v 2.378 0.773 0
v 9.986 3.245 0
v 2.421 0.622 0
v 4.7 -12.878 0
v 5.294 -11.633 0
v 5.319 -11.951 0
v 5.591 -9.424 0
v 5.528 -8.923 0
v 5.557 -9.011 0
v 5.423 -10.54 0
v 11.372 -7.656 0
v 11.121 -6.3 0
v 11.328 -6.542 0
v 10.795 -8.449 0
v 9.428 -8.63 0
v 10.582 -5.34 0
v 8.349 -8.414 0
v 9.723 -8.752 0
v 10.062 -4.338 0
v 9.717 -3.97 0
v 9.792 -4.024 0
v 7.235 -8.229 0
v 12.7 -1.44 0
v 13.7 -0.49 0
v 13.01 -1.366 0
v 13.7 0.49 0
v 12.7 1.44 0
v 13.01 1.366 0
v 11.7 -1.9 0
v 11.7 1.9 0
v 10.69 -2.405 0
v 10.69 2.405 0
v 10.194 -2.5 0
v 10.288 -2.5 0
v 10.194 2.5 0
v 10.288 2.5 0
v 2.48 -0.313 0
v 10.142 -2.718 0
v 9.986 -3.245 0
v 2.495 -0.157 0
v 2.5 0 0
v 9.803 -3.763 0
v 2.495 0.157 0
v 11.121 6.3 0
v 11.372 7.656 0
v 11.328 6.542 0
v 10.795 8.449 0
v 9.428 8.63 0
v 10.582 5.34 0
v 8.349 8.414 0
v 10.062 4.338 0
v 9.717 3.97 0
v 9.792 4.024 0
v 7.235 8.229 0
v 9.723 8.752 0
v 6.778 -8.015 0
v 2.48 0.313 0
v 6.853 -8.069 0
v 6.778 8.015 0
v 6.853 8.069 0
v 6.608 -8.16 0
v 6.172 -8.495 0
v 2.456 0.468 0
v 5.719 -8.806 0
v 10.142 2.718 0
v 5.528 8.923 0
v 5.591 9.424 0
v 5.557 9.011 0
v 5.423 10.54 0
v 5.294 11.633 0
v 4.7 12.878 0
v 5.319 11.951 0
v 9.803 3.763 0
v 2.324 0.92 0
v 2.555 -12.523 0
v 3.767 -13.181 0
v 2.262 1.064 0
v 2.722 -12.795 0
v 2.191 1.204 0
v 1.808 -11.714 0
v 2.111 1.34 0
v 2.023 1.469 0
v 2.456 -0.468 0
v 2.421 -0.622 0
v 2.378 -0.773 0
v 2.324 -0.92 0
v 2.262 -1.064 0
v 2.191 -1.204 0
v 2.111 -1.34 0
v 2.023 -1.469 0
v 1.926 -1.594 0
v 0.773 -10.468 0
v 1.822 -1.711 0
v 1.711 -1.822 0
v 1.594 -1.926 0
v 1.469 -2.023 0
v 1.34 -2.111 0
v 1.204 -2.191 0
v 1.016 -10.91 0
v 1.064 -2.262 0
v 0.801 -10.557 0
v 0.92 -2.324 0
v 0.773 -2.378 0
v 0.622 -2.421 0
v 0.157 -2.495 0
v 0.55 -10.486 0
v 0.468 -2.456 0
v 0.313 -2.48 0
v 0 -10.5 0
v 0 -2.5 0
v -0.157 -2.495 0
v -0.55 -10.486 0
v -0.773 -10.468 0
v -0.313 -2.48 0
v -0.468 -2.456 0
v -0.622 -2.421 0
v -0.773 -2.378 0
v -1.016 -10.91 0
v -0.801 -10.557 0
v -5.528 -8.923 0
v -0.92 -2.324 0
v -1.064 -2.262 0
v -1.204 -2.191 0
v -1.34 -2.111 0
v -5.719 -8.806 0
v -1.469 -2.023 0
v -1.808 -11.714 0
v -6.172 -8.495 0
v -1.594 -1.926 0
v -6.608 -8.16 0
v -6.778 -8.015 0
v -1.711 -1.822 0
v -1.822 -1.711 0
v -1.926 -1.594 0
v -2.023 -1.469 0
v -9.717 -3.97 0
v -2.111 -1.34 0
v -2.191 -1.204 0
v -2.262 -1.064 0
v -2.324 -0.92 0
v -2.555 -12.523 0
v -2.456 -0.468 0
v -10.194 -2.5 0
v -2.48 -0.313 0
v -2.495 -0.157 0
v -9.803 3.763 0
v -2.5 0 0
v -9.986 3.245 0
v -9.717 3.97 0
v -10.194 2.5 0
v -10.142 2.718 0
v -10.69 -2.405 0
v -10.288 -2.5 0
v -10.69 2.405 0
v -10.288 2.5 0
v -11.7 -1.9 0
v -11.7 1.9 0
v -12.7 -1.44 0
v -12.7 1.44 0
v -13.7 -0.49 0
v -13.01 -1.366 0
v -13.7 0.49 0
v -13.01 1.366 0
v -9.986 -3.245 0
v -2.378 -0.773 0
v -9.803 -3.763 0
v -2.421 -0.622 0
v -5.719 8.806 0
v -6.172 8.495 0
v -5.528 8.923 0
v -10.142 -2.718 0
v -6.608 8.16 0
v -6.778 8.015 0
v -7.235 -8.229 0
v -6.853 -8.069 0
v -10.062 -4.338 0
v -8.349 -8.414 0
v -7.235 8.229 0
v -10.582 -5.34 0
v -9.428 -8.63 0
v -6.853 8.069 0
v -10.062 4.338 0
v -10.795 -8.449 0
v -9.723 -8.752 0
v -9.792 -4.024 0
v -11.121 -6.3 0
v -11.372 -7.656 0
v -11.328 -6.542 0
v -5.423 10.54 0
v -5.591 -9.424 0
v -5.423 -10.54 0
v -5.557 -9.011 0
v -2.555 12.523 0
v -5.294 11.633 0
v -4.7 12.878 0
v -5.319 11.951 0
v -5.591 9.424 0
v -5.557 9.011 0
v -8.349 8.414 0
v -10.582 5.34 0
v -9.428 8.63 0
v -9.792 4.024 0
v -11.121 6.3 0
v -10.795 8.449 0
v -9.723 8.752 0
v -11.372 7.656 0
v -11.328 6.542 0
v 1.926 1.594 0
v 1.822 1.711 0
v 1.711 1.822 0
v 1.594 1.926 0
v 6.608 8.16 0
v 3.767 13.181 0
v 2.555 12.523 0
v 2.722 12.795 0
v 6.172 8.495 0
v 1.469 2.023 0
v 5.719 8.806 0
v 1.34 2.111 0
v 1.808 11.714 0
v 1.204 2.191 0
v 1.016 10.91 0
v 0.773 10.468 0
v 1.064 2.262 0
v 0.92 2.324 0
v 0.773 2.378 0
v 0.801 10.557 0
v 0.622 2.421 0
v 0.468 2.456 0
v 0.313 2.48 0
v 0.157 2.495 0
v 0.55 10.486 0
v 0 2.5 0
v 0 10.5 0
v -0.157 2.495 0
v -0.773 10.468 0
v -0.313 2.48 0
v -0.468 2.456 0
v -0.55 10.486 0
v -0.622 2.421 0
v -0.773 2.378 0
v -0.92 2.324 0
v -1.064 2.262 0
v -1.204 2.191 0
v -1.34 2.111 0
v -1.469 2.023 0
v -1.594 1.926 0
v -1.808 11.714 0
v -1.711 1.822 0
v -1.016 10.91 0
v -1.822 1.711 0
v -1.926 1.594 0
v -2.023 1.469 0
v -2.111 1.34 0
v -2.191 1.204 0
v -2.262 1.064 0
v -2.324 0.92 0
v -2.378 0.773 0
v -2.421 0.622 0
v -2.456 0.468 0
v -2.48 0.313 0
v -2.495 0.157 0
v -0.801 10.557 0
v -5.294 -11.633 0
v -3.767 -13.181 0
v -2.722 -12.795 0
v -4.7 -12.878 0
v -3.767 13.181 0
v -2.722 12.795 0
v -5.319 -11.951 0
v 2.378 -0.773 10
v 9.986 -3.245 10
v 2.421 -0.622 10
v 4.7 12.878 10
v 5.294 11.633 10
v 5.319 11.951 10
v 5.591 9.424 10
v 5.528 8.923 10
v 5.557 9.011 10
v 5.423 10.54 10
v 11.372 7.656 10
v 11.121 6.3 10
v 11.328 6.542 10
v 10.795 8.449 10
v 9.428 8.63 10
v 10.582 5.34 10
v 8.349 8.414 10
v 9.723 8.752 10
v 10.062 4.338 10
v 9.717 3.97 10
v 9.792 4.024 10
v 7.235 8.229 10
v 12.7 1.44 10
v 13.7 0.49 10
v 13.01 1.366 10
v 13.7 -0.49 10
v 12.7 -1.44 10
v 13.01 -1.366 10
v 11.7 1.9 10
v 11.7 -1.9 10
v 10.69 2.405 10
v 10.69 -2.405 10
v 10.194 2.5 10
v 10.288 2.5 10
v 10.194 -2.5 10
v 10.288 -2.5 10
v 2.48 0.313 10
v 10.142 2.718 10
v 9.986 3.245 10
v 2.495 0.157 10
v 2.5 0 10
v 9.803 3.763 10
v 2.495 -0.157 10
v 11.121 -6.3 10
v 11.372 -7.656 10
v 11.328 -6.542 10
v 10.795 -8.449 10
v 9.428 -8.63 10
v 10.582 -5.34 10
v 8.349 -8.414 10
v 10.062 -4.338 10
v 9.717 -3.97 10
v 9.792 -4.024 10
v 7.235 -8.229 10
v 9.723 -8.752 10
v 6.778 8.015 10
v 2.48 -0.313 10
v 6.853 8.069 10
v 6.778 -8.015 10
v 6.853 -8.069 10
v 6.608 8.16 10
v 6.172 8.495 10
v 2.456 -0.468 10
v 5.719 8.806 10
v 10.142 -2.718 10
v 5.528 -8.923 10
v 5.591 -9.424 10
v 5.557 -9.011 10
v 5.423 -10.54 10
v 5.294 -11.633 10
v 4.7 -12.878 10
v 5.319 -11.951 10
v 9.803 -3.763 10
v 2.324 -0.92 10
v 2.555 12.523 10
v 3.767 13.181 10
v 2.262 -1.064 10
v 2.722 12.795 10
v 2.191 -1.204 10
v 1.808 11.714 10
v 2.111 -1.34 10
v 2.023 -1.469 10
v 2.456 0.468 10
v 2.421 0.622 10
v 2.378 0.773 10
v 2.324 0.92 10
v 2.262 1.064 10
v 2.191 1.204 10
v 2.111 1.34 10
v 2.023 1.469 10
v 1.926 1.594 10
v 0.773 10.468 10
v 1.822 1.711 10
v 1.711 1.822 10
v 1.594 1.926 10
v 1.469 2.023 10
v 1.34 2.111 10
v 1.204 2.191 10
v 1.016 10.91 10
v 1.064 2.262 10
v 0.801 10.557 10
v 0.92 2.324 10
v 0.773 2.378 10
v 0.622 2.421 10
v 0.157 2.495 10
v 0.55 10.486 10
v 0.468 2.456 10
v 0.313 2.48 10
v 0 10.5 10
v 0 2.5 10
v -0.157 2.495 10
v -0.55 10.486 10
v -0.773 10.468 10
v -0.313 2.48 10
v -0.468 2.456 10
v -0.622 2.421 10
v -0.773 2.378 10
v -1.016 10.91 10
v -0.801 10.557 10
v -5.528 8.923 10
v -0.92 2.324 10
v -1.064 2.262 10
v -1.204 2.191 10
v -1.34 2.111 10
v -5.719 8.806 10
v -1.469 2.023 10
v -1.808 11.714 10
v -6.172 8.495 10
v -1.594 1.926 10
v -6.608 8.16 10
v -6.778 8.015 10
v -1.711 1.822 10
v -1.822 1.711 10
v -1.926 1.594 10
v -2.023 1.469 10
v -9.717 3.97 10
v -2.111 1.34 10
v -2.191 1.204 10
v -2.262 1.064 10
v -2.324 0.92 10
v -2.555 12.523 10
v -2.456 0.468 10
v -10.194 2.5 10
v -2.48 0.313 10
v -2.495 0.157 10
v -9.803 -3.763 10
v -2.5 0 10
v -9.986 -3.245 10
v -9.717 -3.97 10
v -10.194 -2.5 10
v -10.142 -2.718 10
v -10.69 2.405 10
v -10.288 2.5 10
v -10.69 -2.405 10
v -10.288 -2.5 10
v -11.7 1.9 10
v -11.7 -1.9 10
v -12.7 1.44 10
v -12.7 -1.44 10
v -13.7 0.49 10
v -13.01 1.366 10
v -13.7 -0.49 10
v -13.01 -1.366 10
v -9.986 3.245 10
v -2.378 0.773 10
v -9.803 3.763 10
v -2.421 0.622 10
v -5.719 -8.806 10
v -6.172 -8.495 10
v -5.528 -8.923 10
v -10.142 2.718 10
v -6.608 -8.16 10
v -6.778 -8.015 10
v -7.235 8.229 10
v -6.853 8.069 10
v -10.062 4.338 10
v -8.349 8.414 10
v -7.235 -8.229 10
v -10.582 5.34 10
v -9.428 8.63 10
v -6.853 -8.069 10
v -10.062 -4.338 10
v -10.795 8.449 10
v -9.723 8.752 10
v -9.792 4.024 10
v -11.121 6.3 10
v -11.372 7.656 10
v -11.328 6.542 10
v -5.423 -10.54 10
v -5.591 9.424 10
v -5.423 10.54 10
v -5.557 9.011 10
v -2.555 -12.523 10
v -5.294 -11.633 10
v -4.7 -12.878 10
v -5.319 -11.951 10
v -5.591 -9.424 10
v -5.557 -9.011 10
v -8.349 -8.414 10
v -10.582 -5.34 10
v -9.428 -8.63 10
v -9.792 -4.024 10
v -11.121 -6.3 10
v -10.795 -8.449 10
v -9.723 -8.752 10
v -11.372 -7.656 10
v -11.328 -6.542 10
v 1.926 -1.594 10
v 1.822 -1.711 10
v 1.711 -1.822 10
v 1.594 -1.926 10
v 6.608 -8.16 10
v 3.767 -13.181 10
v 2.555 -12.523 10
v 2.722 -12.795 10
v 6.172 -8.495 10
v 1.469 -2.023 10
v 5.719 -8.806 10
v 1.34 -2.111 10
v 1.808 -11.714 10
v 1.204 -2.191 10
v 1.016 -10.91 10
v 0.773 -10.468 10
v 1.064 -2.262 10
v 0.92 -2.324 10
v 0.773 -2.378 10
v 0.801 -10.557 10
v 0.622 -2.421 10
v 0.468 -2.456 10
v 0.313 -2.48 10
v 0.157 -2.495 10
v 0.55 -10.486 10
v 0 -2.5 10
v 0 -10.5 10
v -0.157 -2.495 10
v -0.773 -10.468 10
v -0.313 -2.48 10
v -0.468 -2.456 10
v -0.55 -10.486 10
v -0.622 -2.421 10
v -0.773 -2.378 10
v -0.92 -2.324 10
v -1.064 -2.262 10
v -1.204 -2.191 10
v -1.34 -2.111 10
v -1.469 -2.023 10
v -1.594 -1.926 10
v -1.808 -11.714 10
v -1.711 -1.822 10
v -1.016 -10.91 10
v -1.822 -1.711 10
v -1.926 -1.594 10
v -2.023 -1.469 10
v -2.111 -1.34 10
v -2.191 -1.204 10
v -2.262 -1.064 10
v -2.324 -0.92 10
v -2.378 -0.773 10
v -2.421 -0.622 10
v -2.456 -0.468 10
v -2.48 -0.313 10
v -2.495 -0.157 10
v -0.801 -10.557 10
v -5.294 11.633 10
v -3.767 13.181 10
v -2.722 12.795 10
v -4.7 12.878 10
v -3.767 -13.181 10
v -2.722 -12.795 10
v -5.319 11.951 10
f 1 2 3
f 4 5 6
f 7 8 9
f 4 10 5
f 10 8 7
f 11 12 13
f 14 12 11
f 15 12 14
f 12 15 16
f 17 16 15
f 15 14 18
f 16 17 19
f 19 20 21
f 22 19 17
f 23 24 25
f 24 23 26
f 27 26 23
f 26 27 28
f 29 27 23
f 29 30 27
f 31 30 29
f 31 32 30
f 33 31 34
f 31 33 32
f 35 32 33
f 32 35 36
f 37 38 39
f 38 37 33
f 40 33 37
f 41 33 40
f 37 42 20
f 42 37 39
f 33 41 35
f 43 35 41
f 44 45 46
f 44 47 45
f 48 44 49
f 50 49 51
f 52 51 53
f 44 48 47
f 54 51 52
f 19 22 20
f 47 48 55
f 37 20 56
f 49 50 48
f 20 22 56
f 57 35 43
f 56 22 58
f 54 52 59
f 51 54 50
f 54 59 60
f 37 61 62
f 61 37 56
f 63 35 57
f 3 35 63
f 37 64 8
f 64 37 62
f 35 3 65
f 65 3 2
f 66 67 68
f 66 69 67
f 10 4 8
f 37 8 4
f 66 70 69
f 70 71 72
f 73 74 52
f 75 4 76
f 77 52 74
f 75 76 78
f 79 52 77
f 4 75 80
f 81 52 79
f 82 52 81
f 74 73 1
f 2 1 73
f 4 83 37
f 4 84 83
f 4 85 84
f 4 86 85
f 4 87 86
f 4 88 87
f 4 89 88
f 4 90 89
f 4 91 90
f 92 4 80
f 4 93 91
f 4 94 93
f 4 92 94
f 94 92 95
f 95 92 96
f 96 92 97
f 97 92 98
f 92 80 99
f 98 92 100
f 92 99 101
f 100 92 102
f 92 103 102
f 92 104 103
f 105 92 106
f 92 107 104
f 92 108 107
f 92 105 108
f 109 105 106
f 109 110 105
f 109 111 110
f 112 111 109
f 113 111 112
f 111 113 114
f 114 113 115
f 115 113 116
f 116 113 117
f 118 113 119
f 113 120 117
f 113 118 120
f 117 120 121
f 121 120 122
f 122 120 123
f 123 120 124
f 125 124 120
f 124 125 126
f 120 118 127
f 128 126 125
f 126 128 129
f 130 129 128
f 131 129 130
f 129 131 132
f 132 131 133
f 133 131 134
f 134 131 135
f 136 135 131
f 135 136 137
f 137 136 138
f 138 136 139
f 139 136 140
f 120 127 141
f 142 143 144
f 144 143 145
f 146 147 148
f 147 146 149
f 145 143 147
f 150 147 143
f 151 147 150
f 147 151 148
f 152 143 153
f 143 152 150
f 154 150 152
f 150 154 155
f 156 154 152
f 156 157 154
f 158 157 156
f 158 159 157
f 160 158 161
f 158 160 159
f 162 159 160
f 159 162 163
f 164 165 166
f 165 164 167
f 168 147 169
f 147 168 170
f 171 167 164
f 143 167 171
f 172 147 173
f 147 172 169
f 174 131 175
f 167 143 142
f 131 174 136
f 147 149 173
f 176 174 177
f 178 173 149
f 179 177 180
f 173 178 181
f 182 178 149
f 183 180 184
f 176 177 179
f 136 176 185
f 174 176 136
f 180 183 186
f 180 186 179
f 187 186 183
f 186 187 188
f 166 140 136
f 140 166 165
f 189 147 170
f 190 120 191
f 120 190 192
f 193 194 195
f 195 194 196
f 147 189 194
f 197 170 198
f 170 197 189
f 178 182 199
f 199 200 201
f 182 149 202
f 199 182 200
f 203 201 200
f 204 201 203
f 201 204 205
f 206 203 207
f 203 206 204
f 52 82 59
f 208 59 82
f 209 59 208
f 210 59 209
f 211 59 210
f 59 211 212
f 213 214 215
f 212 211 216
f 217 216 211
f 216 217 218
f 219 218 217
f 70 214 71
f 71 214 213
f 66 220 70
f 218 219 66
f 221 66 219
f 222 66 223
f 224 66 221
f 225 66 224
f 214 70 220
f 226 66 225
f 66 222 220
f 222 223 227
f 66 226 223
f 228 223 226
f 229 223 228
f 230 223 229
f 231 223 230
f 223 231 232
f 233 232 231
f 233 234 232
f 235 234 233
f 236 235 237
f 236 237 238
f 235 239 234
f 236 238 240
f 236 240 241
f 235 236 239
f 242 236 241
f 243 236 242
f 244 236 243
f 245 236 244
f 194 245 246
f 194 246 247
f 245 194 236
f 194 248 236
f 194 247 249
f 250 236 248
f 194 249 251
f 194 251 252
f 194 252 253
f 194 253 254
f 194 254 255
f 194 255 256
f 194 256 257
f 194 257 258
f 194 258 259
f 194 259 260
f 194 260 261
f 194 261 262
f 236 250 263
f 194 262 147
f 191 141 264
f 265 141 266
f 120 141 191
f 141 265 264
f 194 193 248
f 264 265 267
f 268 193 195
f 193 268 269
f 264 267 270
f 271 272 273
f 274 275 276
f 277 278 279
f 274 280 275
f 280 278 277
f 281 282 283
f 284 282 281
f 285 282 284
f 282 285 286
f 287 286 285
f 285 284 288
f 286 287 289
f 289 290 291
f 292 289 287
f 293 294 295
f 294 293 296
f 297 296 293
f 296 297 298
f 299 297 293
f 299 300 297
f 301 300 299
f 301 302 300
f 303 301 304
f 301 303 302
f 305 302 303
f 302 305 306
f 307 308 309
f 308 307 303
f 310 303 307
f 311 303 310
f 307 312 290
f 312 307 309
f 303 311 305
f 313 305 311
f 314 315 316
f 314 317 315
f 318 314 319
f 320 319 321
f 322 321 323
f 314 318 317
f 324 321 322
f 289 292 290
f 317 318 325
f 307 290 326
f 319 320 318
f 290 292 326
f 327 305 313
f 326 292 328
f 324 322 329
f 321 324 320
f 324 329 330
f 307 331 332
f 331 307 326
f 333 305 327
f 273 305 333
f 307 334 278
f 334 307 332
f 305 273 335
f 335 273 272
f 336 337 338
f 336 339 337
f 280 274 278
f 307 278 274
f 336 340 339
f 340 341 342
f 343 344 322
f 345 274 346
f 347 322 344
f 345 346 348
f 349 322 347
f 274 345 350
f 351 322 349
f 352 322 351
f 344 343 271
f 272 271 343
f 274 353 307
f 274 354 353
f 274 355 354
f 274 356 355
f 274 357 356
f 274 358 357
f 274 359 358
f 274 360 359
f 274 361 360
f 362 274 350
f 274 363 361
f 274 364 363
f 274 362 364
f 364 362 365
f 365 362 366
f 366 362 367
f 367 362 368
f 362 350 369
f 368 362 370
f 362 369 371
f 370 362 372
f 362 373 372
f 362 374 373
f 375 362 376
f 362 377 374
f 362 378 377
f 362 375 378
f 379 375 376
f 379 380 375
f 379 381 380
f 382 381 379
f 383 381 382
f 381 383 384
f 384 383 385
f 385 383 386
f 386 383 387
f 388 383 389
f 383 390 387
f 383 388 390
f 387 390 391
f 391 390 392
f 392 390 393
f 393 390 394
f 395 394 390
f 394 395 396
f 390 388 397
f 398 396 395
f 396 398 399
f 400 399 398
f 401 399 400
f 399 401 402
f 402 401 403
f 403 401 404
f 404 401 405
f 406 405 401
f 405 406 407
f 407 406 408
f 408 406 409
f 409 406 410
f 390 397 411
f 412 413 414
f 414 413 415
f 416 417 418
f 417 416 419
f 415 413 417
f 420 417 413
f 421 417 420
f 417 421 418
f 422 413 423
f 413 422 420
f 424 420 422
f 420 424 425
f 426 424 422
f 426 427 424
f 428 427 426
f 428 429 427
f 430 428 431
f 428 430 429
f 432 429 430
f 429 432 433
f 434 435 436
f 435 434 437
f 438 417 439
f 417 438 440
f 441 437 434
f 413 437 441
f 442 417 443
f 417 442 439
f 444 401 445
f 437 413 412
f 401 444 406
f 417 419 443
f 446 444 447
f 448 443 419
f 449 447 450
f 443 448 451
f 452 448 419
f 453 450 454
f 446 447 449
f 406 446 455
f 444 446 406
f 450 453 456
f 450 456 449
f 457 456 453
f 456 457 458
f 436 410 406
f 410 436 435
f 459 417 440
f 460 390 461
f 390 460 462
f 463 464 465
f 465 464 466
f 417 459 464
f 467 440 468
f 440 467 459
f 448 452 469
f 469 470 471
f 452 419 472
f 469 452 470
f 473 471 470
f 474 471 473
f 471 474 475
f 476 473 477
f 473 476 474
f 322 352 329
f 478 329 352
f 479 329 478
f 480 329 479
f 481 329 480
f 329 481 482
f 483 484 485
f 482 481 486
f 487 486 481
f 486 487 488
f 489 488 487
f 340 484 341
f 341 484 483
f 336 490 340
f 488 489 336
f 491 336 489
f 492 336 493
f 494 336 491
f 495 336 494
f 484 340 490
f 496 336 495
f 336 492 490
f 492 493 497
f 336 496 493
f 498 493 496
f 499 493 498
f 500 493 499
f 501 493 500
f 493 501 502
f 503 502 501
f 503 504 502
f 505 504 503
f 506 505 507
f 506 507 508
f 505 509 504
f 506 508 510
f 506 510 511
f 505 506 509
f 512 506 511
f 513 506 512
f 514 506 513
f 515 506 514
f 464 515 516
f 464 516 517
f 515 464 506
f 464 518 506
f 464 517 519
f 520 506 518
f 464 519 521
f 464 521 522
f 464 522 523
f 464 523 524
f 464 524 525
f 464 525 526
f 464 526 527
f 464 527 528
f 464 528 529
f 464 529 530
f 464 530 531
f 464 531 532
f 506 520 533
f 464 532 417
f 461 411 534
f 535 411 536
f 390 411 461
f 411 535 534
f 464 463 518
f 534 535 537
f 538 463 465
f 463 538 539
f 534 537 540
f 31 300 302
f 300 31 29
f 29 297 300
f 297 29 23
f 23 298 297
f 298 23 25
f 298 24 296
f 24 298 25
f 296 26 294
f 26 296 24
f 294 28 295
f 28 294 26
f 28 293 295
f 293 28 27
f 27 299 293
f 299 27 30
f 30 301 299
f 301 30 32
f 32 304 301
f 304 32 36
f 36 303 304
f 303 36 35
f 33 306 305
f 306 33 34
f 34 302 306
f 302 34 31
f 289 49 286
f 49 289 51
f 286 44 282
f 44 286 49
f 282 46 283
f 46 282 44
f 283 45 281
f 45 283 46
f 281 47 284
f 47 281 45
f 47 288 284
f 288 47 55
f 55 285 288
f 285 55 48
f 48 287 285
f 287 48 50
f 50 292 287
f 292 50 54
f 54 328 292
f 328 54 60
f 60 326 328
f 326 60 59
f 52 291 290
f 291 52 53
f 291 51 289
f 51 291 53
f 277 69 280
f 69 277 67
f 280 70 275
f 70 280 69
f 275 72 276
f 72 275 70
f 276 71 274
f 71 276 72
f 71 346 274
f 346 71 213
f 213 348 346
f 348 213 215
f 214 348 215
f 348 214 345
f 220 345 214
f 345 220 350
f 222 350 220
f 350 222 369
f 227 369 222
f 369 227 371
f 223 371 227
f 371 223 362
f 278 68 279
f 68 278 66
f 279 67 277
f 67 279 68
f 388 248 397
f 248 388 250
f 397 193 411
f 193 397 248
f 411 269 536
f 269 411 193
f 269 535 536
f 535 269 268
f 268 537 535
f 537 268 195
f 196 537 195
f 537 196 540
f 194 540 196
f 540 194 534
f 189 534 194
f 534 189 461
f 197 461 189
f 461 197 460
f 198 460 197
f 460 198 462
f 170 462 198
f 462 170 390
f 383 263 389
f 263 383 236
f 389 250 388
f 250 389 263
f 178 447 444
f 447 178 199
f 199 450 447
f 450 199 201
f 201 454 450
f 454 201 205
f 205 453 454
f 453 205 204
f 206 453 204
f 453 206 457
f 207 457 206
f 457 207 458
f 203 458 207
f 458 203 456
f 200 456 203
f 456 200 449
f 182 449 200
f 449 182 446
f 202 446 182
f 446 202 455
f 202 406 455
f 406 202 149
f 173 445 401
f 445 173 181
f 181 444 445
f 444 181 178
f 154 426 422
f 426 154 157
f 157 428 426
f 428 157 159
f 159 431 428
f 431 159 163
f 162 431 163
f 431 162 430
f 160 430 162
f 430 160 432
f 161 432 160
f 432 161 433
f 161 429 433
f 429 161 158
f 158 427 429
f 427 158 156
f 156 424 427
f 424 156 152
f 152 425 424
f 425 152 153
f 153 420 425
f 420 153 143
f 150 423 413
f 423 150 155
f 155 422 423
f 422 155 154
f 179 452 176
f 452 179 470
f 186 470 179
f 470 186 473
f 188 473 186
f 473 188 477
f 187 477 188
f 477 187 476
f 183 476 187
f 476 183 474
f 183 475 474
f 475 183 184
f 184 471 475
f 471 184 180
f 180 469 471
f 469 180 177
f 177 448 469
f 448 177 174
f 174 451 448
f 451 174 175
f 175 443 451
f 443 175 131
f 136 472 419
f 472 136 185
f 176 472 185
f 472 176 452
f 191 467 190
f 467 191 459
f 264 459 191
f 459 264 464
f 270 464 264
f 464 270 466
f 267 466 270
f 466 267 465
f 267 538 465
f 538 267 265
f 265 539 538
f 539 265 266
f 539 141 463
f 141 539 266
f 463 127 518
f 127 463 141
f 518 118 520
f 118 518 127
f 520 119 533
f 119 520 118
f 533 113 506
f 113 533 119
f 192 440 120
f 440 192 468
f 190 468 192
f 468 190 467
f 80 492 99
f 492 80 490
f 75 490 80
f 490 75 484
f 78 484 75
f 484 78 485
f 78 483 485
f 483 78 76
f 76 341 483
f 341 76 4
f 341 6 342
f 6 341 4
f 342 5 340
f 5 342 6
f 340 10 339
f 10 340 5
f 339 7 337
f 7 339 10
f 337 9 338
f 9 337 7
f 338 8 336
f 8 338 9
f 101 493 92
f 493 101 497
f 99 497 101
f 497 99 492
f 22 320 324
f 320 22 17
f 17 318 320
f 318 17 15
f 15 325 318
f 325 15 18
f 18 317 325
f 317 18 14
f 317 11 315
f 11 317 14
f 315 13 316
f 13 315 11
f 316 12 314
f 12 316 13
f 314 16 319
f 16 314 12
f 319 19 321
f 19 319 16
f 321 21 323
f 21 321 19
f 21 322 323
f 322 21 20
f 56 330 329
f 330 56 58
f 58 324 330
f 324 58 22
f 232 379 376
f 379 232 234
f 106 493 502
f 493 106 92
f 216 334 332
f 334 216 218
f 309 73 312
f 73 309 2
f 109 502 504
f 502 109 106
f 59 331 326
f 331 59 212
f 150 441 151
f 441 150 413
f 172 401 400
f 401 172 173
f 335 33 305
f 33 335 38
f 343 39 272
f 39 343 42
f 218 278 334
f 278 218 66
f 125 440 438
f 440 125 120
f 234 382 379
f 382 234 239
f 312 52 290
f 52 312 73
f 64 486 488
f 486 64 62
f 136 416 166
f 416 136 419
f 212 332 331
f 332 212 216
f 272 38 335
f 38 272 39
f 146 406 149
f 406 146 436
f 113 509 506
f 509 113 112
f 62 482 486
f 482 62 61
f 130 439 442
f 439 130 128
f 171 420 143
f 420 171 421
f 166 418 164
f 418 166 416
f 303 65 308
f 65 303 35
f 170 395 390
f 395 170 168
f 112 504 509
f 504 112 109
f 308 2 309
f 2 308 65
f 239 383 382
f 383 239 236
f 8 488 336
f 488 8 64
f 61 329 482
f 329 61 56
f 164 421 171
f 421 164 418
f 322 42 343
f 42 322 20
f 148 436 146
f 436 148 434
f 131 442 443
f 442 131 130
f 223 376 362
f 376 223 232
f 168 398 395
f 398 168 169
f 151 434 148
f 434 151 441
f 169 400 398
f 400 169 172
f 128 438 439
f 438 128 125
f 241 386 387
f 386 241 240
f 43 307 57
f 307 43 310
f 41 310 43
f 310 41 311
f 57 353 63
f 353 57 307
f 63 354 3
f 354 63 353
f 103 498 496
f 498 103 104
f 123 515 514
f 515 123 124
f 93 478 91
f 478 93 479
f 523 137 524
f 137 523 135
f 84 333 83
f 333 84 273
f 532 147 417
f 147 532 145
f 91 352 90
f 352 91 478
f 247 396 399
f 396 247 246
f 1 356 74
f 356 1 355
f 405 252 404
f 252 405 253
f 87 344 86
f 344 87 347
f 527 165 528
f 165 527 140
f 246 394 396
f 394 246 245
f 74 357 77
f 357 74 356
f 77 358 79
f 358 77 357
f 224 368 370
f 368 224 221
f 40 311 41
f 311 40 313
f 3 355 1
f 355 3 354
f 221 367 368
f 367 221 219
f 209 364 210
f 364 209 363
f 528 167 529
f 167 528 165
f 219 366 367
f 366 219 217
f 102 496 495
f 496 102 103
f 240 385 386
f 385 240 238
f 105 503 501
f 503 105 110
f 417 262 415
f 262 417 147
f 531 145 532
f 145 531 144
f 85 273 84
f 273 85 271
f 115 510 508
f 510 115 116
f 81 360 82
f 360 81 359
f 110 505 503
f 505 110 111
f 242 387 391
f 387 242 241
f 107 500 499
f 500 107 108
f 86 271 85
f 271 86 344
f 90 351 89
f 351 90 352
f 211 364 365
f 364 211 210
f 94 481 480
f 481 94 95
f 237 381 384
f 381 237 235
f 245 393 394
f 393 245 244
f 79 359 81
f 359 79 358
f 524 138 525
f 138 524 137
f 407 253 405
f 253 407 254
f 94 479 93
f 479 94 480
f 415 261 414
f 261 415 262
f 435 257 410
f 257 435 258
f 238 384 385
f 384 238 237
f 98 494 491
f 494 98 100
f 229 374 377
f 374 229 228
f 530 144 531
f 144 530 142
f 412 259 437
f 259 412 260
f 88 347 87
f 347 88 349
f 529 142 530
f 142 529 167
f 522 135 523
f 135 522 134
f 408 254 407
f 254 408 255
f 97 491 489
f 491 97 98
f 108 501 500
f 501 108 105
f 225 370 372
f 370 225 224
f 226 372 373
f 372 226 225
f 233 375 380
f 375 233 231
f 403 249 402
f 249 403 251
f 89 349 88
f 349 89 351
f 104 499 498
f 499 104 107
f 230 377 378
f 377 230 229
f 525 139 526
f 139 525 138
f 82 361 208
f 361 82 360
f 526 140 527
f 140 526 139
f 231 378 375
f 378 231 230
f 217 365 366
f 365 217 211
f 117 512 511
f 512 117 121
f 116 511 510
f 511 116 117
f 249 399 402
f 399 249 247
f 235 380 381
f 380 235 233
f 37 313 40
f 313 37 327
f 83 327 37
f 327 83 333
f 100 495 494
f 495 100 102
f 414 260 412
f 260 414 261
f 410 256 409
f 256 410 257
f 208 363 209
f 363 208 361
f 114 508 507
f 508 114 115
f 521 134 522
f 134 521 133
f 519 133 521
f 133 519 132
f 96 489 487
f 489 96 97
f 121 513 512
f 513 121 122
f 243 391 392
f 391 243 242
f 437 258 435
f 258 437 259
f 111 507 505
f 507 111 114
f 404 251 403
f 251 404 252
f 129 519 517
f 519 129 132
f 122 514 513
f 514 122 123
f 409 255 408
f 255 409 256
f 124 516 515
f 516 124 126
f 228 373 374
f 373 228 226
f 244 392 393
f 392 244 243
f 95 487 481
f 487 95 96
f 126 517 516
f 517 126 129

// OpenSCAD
// Gabriel Riqueto 
// Gabriel Oliveira
// Leonardo Mansur
// Sabrina Flores

// Parâmetros (mm)
outer_diameter = 25;
height = 10;
hole_diameter = 5;
teeth = 10;
tooth_width = 5;          // largura da base do dente
tooth_tip_width = 2.4;    // largura da ponta
tooth_depth = 4;
blend = 0.8;              // quanto o dente entra no corpo
round_r = 0.9;            // arredondamento dos dentes

module hill_tooth() {
    linear_extrude(height = height)
        offset(r = round_r)
            offset(delta = -round_r)
                polygon(points = [
                    [-blend, -tooth_width/2],                 // entra no corpo
                    [0.8,    -tooth_width/2],
                    [2.0,    -tooth_width*0.38],
                    [3.0,    -tooth_tip_width*0.60],
                    [tooth_depth, -tooth_tip_width/2],

                    [tooth_depth,  tooth_tip_width/2],
                    [3.0,     tooth_tip_width*0.60],
                    [2.0,     tooth_width*0.38],
                    [0.8,     tooth_width/2],
                    [-blend,  tooth_width/2]
                ]);
}

module gear() {
    difference() {
        union() {
            // Corpo principal
            cylinder(d = outer_diameter - tooth_depth, h = height, $fn = 120);

            // Dentes arredondados e conectados ao corpo
            for (i = [0 : teeth - 1]) {
                rotate([0, 0, i * 360 / teeth])
                    translate([(outer_diameter - tooth_depth)/2 - blend, 0, 0])
                        hill_tooth();
            }
        }

        // Furo central
        translate([0,0,-1])
            cylinder(d = hole_diameter, h = height + 2, $fn = 100);
    }
}

gear();
